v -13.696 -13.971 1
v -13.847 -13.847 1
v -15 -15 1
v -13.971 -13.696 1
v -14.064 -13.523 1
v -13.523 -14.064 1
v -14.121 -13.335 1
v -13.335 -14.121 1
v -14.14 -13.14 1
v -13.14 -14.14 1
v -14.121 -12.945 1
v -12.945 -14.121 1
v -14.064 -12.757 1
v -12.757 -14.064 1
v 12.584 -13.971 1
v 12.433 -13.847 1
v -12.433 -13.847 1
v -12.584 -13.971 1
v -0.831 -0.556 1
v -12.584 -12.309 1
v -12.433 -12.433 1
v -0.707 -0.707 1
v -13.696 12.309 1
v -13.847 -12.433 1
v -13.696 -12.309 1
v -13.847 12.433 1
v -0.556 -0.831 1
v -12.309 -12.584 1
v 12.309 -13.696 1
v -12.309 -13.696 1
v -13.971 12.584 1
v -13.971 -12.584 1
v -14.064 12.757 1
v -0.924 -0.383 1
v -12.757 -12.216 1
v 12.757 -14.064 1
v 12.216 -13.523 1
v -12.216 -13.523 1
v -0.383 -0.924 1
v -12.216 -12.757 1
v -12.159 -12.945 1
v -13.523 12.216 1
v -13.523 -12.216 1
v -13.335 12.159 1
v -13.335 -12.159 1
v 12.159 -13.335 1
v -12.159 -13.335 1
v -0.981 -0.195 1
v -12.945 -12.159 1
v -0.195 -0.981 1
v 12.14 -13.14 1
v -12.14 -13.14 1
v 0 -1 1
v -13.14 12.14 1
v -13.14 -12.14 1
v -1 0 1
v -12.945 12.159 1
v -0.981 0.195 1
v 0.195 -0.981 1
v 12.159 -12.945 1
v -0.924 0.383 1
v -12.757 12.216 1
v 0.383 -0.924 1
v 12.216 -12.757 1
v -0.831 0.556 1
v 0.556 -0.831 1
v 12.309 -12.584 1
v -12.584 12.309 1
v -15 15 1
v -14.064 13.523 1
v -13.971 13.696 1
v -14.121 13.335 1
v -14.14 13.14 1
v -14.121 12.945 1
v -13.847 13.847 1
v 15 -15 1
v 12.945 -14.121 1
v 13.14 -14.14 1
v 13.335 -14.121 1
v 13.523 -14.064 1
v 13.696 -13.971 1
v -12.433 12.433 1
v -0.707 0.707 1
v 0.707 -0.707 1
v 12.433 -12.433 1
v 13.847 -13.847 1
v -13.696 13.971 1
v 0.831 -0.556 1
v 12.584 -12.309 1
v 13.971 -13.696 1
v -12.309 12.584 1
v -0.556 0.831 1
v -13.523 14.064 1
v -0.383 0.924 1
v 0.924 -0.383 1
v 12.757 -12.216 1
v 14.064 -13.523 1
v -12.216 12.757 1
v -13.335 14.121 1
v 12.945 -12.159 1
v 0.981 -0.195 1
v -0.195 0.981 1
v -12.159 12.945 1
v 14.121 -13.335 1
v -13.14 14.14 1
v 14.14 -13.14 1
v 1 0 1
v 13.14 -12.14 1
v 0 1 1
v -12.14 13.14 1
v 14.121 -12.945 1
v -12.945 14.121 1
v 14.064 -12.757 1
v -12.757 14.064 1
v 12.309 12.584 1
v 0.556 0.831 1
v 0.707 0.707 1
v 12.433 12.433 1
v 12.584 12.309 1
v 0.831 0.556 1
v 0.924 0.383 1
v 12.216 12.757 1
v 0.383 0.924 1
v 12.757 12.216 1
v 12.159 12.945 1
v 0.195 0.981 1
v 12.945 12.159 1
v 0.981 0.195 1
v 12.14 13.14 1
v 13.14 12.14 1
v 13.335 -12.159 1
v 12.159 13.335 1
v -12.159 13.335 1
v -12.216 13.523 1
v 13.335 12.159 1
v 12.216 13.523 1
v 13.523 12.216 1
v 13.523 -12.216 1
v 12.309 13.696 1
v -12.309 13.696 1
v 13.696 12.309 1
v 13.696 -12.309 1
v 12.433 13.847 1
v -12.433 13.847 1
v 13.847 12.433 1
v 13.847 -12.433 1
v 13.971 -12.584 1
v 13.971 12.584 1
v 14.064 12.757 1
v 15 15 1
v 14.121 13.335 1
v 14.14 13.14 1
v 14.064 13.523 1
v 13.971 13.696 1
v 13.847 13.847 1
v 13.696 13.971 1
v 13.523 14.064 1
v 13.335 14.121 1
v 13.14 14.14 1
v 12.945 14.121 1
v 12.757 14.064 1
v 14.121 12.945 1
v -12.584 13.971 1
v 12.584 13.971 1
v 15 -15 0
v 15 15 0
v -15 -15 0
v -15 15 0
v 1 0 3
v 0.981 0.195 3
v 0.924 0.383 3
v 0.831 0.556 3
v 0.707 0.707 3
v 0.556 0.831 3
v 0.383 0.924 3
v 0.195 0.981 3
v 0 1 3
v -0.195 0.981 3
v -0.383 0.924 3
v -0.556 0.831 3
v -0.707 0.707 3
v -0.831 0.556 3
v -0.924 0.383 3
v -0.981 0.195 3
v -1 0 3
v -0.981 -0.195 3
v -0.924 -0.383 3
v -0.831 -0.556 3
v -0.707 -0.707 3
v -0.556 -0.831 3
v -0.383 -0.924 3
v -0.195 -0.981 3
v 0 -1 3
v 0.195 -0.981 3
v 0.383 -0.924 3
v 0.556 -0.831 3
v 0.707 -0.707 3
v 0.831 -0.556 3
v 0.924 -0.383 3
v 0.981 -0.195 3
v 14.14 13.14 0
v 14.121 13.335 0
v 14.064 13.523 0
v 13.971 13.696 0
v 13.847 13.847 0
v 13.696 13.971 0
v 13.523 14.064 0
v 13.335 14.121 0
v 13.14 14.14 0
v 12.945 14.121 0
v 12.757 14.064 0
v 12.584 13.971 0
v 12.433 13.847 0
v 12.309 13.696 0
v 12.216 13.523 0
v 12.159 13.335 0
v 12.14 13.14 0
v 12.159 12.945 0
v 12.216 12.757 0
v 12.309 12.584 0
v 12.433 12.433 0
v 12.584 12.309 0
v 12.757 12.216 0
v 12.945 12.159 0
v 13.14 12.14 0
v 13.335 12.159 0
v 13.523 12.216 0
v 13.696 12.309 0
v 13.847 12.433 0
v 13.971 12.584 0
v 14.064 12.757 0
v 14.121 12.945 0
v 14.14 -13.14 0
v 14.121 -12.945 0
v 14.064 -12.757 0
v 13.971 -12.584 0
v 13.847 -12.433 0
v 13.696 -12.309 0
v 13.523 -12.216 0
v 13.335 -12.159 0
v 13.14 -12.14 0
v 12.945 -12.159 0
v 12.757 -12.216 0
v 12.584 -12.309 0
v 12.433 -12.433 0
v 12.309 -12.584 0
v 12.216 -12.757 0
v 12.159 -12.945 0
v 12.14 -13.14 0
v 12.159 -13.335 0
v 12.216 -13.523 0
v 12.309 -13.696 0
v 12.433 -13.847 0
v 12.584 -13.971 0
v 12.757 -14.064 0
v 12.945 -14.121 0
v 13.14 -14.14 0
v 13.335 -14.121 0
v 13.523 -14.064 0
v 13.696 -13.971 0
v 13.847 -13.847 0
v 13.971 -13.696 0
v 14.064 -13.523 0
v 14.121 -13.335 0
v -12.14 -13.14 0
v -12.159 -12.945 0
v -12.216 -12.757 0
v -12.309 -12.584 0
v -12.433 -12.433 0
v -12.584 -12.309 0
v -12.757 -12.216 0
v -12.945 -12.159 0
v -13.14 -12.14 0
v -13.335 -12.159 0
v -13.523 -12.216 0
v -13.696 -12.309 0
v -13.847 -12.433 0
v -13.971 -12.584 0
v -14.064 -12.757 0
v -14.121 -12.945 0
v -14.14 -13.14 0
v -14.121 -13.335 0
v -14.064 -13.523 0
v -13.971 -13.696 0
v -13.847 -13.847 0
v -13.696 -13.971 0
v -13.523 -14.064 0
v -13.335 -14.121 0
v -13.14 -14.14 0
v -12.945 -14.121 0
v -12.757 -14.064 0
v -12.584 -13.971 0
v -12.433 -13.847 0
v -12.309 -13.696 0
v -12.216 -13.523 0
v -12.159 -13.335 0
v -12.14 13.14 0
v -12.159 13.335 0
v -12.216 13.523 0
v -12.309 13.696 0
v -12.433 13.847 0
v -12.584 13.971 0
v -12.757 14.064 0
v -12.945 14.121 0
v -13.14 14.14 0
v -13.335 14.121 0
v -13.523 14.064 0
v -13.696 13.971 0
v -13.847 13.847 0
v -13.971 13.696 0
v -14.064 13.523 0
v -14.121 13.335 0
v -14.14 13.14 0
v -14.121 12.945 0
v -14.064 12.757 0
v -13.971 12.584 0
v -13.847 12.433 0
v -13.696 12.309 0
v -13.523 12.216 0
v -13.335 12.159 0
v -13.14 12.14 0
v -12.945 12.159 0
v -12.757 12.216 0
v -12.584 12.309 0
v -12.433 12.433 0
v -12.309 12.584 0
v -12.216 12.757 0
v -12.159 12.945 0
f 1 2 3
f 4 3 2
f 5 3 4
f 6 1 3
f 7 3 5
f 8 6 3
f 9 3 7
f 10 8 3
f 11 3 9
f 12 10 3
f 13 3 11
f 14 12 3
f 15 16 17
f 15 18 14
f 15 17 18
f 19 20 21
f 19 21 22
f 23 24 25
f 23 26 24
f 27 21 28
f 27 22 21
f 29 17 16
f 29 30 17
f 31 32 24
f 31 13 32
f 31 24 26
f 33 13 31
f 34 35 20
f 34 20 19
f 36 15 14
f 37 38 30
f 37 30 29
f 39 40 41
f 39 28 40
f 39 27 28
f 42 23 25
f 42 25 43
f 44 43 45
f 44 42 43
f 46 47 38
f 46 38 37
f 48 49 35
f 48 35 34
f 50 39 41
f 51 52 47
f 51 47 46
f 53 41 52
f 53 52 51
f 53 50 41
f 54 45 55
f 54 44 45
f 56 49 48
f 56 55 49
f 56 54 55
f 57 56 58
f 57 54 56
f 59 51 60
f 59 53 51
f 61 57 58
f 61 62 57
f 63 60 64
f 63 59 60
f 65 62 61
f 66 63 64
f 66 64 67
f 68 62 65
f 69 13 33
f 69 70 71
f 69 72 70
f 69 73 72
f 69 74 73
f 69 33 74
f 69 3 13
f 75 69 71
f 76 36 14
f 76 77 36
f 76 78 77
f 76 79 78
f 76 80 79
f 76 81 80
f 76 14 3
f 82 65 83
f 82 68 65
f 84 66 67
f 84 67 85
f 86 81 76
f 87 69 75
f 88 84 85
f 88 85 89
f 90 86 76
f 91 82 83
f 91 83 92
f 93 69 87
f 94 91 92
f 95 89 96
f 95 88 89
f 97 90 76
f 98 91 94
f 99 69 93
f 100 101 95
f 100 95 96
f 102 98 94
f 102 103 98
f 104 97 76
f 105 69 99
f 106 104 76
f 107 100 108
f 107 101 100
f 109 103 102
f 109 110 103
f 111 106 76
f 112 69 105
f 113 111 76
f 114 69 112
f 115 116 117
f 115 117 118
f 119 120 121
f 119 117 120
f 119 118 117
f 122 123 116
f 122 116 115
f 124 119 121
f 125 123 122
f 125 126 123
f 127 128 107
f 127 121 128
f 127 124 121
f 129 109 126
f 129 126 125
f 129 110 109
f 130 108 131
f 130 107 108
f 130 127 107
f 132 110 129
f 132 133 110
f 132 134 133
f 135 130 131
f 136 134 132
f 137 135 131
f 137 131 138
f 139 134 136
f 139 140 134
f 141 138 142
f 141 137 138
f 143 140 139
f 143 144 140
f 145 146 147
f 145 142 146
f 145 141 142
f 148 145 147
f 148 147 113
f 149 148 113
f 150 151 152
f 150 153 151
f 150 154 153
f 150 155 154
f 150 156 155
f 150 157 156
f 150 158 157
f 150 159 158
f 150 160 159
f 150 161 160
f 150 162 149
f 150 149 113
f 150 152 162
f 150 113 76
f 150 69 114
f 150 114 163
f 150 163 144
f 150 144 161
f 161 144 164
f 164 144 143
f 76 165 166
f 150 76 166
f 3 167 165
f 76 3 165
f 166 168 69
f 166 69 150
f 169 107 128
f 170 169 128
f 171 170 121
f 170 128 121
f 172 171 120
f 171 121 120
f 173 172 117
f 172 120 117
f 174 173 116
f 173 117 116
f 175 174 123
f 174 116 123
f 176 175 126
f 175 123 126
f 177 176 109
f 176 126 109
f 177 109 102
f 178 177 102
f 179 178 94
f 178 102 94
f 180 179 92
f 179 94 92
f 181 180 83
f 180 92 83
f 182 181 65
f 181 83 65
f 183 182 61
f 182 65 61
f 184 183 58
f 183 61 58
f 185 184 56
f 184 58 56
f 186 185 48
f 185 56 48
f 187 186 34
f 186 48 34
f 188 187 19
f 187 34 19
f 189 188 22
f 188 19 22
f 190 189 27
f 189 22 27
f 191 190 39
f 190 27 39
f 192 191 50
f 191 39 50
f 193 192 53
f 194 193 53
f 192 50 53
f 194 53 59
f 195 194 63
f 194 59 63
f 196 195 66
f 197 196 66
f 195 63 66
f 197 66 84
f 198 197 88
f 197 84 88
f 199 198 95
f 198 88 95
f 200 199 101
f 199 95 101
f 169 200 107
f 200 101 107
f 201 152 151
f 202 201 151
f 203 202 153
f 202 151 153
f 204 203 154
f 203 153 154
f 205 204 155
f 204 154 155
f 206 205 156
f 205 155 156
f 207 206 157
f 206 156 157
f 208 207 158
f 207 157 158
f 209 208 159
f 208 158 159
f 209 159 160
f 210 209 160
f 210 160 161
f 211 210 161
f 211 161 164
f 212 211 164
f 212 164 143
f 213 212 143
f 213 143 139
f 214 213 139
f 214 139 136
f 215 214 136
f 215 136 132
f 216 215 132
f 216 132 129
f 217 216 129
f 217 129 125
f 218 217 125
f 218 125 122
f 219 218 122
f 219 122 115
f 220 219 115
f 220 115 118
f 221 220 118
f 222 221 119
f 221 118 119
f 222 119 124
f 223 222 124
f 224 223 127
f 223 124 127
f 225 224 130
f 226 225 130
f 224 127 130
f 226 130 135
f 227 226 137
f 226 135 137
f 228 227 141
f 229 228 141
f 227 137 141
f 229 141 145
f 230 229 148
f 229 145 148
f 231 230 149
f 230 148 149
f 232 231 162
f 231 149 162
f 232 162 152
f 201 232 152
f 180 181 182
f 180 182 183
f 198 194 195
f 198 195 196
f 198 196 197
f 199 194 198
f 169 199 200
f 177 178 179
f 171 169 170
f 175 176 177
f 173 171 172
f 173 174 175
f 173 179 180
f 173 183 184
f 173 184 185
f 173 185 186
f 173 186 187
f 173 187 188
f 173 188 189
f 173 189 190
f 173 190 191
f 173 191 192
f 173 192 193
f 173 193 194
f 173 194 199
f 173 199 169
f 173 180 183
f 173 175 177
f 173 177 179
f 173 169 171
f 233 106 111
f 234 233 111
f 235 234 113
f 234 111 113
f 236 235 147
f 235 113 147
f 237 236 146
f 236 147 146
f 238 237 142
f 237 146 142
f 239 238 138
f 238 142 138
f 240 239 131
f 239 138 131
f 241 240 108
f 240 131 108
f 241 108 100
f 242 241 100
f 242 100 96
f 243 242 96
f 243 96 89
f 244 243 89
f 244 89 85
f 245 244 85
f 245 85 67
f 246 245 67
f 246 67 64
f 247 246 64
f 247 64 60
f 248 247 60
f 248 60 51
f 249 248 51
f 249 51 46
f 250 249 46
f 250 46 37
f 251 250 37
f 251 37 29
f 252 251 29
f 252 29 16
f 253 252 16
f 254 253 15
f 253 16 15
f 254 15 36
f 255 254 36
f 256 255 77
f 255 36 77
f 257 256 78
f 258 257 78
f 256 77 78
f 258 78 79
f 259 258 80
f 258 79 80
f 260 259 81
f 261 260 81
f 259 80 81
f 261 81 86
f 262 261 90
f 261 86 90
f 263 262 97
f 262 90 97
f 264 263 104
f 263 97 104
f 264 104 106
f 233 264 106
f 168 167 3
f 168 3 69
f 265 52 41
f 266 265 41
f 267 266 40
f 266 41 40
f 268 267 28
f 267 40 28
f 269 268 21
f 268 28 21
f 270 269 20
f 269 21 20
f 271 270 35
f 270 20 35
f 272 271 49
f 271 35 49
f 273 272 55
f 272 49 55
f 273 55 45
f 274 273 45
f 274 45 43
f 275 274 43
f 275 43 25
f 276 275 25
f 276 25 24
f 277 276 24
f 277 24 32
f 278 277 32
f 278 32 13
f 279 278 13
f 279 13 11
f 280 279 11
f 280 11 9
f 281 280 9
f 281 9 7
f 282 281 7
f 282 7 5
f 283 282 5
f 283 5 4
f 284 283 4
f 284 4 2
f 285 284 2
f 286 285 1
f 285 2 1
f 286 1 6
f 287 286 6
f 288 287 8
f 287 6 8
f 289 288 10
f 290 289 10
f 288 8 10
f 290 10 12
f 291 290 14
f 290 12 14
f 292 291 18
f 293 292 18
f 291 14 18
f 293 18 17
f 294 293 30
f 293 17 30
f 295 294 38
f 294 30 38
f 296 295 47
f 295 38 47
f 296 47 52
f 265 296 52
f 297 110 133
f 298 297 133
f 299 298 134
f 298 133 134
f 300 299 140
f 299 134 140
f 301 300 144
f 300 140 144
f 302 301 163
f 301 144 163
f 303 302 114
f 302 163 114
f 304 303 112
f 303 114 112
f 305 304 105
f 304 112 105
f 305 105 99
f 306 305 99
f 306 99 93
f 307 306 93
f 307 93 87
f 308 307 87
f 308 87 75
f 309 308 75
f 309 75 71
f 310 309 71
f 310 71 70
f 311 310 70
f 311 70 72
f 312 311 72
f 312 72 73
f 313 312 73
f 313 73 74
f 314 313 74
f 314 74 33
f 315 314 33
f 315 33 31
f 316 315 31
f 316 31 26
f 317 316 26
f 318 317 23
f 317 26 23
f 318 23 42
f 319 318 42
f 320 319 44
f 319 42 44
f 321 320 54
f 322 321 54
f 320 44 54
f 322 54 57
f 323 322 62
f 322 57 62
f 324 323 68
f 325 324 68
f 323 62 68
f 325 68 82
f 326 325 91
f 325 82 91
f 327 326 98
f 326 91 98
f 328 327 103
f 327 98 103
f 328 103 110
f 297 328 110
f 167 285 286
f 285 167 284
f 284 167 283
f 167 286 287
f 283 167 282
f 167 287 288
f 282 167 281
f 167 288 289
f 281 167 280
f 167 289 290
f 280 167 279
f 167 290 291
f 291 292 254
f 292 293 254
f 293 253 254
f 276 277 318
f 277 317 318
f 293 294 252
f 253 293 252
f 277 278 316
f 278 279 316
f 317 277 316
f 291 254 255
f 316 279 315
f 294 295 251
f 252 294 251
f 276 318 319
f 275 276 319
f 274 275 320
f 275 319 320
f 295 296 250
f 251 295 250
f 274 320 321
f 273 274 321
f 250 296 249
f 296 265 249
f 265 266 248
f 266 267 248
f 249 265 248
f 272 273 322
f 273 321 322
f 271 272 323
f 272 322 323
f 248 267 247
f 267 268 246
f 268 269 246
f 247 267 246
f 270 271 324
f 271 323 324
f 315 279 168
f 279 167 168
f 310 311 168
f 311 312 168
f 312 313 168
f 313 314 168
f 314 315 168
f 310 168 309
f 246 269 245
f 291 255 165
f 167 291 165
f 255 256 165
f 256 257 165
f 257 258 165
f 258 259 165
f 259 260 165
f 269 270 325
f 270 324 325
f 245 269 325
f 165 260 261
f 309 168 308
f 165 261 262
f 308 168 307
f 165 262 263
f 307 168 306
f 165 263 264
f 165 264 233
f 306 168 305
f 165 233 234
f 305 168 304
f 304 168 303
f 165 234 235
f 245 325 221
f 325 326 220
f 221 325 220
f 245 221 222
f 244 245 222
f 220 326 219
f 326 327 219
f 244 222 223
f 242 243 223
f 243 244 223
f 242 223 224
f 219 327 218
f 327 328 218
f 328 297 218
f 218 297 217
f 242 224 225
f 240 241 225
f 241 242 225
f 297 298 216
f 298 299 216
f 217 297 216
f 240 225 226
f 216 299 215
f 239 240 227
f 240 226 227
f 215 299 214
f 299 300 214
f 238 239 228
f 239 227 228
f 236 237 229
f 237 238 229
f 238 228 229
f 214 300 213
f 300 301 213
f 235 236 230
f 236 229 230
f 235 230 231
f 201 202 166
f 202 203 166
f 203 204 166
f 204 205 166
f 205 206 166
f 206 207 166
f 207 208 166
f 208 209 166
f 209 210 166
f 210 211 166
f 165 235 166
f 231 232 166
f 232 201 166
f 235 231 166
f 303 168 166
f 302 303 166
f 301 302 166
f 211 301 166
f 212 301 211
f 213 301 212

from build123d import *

# Parameters (mm, degrees)
SKETCH1_W           = 30
SKETCH1_H           = 30
BOSS_EXTRUDE1_DEPTH = 1
SKETCH2_R           = 1
CUT_EXTRUDE1_DEPTH  = 2
SKETCH3_R           = 1
BOSS_EXTRUDE2_DEPTH = 2


with BuildPart() as part:
    # Sketch1 → Boss-Extrude1 (new body)
    with BuildSketch(Plane.XY):
        Rectangle(SKETCH1_W, SKETCH1_H)
    extrude(amount=BOSS_EXTRUDE1_DEPTH)

    # Sketch2 → Cut-Extrude1 (cut, through all)
    with BuildSketch(Plane.XY.offset(1)):
        with Locations((-13.14, 13.14)):
            Circle(SKETCH2_R)
        with Locations((13.14, 13.14)):
            Circle(SKETCH2_R)
        with Locations((13.14, -13.14)):
            Circle(SKETCH2_R)
        with Locations((-13.14, -13.14)):
            Circle(SKETCH2_R)
    extrude(amount=-CUT_EXTRUDE1_DEPTH, mode=Mode.SUBTRACT)

    # Sketch3 → Boss-Extrude2 (add)
    with BuildSketch(Plane.XY.offset(1)):
        Circle(SKETCH3_R)
    extrude(amount=BOSS_EXTRUDE2_DEPTH)


solid = part.part
